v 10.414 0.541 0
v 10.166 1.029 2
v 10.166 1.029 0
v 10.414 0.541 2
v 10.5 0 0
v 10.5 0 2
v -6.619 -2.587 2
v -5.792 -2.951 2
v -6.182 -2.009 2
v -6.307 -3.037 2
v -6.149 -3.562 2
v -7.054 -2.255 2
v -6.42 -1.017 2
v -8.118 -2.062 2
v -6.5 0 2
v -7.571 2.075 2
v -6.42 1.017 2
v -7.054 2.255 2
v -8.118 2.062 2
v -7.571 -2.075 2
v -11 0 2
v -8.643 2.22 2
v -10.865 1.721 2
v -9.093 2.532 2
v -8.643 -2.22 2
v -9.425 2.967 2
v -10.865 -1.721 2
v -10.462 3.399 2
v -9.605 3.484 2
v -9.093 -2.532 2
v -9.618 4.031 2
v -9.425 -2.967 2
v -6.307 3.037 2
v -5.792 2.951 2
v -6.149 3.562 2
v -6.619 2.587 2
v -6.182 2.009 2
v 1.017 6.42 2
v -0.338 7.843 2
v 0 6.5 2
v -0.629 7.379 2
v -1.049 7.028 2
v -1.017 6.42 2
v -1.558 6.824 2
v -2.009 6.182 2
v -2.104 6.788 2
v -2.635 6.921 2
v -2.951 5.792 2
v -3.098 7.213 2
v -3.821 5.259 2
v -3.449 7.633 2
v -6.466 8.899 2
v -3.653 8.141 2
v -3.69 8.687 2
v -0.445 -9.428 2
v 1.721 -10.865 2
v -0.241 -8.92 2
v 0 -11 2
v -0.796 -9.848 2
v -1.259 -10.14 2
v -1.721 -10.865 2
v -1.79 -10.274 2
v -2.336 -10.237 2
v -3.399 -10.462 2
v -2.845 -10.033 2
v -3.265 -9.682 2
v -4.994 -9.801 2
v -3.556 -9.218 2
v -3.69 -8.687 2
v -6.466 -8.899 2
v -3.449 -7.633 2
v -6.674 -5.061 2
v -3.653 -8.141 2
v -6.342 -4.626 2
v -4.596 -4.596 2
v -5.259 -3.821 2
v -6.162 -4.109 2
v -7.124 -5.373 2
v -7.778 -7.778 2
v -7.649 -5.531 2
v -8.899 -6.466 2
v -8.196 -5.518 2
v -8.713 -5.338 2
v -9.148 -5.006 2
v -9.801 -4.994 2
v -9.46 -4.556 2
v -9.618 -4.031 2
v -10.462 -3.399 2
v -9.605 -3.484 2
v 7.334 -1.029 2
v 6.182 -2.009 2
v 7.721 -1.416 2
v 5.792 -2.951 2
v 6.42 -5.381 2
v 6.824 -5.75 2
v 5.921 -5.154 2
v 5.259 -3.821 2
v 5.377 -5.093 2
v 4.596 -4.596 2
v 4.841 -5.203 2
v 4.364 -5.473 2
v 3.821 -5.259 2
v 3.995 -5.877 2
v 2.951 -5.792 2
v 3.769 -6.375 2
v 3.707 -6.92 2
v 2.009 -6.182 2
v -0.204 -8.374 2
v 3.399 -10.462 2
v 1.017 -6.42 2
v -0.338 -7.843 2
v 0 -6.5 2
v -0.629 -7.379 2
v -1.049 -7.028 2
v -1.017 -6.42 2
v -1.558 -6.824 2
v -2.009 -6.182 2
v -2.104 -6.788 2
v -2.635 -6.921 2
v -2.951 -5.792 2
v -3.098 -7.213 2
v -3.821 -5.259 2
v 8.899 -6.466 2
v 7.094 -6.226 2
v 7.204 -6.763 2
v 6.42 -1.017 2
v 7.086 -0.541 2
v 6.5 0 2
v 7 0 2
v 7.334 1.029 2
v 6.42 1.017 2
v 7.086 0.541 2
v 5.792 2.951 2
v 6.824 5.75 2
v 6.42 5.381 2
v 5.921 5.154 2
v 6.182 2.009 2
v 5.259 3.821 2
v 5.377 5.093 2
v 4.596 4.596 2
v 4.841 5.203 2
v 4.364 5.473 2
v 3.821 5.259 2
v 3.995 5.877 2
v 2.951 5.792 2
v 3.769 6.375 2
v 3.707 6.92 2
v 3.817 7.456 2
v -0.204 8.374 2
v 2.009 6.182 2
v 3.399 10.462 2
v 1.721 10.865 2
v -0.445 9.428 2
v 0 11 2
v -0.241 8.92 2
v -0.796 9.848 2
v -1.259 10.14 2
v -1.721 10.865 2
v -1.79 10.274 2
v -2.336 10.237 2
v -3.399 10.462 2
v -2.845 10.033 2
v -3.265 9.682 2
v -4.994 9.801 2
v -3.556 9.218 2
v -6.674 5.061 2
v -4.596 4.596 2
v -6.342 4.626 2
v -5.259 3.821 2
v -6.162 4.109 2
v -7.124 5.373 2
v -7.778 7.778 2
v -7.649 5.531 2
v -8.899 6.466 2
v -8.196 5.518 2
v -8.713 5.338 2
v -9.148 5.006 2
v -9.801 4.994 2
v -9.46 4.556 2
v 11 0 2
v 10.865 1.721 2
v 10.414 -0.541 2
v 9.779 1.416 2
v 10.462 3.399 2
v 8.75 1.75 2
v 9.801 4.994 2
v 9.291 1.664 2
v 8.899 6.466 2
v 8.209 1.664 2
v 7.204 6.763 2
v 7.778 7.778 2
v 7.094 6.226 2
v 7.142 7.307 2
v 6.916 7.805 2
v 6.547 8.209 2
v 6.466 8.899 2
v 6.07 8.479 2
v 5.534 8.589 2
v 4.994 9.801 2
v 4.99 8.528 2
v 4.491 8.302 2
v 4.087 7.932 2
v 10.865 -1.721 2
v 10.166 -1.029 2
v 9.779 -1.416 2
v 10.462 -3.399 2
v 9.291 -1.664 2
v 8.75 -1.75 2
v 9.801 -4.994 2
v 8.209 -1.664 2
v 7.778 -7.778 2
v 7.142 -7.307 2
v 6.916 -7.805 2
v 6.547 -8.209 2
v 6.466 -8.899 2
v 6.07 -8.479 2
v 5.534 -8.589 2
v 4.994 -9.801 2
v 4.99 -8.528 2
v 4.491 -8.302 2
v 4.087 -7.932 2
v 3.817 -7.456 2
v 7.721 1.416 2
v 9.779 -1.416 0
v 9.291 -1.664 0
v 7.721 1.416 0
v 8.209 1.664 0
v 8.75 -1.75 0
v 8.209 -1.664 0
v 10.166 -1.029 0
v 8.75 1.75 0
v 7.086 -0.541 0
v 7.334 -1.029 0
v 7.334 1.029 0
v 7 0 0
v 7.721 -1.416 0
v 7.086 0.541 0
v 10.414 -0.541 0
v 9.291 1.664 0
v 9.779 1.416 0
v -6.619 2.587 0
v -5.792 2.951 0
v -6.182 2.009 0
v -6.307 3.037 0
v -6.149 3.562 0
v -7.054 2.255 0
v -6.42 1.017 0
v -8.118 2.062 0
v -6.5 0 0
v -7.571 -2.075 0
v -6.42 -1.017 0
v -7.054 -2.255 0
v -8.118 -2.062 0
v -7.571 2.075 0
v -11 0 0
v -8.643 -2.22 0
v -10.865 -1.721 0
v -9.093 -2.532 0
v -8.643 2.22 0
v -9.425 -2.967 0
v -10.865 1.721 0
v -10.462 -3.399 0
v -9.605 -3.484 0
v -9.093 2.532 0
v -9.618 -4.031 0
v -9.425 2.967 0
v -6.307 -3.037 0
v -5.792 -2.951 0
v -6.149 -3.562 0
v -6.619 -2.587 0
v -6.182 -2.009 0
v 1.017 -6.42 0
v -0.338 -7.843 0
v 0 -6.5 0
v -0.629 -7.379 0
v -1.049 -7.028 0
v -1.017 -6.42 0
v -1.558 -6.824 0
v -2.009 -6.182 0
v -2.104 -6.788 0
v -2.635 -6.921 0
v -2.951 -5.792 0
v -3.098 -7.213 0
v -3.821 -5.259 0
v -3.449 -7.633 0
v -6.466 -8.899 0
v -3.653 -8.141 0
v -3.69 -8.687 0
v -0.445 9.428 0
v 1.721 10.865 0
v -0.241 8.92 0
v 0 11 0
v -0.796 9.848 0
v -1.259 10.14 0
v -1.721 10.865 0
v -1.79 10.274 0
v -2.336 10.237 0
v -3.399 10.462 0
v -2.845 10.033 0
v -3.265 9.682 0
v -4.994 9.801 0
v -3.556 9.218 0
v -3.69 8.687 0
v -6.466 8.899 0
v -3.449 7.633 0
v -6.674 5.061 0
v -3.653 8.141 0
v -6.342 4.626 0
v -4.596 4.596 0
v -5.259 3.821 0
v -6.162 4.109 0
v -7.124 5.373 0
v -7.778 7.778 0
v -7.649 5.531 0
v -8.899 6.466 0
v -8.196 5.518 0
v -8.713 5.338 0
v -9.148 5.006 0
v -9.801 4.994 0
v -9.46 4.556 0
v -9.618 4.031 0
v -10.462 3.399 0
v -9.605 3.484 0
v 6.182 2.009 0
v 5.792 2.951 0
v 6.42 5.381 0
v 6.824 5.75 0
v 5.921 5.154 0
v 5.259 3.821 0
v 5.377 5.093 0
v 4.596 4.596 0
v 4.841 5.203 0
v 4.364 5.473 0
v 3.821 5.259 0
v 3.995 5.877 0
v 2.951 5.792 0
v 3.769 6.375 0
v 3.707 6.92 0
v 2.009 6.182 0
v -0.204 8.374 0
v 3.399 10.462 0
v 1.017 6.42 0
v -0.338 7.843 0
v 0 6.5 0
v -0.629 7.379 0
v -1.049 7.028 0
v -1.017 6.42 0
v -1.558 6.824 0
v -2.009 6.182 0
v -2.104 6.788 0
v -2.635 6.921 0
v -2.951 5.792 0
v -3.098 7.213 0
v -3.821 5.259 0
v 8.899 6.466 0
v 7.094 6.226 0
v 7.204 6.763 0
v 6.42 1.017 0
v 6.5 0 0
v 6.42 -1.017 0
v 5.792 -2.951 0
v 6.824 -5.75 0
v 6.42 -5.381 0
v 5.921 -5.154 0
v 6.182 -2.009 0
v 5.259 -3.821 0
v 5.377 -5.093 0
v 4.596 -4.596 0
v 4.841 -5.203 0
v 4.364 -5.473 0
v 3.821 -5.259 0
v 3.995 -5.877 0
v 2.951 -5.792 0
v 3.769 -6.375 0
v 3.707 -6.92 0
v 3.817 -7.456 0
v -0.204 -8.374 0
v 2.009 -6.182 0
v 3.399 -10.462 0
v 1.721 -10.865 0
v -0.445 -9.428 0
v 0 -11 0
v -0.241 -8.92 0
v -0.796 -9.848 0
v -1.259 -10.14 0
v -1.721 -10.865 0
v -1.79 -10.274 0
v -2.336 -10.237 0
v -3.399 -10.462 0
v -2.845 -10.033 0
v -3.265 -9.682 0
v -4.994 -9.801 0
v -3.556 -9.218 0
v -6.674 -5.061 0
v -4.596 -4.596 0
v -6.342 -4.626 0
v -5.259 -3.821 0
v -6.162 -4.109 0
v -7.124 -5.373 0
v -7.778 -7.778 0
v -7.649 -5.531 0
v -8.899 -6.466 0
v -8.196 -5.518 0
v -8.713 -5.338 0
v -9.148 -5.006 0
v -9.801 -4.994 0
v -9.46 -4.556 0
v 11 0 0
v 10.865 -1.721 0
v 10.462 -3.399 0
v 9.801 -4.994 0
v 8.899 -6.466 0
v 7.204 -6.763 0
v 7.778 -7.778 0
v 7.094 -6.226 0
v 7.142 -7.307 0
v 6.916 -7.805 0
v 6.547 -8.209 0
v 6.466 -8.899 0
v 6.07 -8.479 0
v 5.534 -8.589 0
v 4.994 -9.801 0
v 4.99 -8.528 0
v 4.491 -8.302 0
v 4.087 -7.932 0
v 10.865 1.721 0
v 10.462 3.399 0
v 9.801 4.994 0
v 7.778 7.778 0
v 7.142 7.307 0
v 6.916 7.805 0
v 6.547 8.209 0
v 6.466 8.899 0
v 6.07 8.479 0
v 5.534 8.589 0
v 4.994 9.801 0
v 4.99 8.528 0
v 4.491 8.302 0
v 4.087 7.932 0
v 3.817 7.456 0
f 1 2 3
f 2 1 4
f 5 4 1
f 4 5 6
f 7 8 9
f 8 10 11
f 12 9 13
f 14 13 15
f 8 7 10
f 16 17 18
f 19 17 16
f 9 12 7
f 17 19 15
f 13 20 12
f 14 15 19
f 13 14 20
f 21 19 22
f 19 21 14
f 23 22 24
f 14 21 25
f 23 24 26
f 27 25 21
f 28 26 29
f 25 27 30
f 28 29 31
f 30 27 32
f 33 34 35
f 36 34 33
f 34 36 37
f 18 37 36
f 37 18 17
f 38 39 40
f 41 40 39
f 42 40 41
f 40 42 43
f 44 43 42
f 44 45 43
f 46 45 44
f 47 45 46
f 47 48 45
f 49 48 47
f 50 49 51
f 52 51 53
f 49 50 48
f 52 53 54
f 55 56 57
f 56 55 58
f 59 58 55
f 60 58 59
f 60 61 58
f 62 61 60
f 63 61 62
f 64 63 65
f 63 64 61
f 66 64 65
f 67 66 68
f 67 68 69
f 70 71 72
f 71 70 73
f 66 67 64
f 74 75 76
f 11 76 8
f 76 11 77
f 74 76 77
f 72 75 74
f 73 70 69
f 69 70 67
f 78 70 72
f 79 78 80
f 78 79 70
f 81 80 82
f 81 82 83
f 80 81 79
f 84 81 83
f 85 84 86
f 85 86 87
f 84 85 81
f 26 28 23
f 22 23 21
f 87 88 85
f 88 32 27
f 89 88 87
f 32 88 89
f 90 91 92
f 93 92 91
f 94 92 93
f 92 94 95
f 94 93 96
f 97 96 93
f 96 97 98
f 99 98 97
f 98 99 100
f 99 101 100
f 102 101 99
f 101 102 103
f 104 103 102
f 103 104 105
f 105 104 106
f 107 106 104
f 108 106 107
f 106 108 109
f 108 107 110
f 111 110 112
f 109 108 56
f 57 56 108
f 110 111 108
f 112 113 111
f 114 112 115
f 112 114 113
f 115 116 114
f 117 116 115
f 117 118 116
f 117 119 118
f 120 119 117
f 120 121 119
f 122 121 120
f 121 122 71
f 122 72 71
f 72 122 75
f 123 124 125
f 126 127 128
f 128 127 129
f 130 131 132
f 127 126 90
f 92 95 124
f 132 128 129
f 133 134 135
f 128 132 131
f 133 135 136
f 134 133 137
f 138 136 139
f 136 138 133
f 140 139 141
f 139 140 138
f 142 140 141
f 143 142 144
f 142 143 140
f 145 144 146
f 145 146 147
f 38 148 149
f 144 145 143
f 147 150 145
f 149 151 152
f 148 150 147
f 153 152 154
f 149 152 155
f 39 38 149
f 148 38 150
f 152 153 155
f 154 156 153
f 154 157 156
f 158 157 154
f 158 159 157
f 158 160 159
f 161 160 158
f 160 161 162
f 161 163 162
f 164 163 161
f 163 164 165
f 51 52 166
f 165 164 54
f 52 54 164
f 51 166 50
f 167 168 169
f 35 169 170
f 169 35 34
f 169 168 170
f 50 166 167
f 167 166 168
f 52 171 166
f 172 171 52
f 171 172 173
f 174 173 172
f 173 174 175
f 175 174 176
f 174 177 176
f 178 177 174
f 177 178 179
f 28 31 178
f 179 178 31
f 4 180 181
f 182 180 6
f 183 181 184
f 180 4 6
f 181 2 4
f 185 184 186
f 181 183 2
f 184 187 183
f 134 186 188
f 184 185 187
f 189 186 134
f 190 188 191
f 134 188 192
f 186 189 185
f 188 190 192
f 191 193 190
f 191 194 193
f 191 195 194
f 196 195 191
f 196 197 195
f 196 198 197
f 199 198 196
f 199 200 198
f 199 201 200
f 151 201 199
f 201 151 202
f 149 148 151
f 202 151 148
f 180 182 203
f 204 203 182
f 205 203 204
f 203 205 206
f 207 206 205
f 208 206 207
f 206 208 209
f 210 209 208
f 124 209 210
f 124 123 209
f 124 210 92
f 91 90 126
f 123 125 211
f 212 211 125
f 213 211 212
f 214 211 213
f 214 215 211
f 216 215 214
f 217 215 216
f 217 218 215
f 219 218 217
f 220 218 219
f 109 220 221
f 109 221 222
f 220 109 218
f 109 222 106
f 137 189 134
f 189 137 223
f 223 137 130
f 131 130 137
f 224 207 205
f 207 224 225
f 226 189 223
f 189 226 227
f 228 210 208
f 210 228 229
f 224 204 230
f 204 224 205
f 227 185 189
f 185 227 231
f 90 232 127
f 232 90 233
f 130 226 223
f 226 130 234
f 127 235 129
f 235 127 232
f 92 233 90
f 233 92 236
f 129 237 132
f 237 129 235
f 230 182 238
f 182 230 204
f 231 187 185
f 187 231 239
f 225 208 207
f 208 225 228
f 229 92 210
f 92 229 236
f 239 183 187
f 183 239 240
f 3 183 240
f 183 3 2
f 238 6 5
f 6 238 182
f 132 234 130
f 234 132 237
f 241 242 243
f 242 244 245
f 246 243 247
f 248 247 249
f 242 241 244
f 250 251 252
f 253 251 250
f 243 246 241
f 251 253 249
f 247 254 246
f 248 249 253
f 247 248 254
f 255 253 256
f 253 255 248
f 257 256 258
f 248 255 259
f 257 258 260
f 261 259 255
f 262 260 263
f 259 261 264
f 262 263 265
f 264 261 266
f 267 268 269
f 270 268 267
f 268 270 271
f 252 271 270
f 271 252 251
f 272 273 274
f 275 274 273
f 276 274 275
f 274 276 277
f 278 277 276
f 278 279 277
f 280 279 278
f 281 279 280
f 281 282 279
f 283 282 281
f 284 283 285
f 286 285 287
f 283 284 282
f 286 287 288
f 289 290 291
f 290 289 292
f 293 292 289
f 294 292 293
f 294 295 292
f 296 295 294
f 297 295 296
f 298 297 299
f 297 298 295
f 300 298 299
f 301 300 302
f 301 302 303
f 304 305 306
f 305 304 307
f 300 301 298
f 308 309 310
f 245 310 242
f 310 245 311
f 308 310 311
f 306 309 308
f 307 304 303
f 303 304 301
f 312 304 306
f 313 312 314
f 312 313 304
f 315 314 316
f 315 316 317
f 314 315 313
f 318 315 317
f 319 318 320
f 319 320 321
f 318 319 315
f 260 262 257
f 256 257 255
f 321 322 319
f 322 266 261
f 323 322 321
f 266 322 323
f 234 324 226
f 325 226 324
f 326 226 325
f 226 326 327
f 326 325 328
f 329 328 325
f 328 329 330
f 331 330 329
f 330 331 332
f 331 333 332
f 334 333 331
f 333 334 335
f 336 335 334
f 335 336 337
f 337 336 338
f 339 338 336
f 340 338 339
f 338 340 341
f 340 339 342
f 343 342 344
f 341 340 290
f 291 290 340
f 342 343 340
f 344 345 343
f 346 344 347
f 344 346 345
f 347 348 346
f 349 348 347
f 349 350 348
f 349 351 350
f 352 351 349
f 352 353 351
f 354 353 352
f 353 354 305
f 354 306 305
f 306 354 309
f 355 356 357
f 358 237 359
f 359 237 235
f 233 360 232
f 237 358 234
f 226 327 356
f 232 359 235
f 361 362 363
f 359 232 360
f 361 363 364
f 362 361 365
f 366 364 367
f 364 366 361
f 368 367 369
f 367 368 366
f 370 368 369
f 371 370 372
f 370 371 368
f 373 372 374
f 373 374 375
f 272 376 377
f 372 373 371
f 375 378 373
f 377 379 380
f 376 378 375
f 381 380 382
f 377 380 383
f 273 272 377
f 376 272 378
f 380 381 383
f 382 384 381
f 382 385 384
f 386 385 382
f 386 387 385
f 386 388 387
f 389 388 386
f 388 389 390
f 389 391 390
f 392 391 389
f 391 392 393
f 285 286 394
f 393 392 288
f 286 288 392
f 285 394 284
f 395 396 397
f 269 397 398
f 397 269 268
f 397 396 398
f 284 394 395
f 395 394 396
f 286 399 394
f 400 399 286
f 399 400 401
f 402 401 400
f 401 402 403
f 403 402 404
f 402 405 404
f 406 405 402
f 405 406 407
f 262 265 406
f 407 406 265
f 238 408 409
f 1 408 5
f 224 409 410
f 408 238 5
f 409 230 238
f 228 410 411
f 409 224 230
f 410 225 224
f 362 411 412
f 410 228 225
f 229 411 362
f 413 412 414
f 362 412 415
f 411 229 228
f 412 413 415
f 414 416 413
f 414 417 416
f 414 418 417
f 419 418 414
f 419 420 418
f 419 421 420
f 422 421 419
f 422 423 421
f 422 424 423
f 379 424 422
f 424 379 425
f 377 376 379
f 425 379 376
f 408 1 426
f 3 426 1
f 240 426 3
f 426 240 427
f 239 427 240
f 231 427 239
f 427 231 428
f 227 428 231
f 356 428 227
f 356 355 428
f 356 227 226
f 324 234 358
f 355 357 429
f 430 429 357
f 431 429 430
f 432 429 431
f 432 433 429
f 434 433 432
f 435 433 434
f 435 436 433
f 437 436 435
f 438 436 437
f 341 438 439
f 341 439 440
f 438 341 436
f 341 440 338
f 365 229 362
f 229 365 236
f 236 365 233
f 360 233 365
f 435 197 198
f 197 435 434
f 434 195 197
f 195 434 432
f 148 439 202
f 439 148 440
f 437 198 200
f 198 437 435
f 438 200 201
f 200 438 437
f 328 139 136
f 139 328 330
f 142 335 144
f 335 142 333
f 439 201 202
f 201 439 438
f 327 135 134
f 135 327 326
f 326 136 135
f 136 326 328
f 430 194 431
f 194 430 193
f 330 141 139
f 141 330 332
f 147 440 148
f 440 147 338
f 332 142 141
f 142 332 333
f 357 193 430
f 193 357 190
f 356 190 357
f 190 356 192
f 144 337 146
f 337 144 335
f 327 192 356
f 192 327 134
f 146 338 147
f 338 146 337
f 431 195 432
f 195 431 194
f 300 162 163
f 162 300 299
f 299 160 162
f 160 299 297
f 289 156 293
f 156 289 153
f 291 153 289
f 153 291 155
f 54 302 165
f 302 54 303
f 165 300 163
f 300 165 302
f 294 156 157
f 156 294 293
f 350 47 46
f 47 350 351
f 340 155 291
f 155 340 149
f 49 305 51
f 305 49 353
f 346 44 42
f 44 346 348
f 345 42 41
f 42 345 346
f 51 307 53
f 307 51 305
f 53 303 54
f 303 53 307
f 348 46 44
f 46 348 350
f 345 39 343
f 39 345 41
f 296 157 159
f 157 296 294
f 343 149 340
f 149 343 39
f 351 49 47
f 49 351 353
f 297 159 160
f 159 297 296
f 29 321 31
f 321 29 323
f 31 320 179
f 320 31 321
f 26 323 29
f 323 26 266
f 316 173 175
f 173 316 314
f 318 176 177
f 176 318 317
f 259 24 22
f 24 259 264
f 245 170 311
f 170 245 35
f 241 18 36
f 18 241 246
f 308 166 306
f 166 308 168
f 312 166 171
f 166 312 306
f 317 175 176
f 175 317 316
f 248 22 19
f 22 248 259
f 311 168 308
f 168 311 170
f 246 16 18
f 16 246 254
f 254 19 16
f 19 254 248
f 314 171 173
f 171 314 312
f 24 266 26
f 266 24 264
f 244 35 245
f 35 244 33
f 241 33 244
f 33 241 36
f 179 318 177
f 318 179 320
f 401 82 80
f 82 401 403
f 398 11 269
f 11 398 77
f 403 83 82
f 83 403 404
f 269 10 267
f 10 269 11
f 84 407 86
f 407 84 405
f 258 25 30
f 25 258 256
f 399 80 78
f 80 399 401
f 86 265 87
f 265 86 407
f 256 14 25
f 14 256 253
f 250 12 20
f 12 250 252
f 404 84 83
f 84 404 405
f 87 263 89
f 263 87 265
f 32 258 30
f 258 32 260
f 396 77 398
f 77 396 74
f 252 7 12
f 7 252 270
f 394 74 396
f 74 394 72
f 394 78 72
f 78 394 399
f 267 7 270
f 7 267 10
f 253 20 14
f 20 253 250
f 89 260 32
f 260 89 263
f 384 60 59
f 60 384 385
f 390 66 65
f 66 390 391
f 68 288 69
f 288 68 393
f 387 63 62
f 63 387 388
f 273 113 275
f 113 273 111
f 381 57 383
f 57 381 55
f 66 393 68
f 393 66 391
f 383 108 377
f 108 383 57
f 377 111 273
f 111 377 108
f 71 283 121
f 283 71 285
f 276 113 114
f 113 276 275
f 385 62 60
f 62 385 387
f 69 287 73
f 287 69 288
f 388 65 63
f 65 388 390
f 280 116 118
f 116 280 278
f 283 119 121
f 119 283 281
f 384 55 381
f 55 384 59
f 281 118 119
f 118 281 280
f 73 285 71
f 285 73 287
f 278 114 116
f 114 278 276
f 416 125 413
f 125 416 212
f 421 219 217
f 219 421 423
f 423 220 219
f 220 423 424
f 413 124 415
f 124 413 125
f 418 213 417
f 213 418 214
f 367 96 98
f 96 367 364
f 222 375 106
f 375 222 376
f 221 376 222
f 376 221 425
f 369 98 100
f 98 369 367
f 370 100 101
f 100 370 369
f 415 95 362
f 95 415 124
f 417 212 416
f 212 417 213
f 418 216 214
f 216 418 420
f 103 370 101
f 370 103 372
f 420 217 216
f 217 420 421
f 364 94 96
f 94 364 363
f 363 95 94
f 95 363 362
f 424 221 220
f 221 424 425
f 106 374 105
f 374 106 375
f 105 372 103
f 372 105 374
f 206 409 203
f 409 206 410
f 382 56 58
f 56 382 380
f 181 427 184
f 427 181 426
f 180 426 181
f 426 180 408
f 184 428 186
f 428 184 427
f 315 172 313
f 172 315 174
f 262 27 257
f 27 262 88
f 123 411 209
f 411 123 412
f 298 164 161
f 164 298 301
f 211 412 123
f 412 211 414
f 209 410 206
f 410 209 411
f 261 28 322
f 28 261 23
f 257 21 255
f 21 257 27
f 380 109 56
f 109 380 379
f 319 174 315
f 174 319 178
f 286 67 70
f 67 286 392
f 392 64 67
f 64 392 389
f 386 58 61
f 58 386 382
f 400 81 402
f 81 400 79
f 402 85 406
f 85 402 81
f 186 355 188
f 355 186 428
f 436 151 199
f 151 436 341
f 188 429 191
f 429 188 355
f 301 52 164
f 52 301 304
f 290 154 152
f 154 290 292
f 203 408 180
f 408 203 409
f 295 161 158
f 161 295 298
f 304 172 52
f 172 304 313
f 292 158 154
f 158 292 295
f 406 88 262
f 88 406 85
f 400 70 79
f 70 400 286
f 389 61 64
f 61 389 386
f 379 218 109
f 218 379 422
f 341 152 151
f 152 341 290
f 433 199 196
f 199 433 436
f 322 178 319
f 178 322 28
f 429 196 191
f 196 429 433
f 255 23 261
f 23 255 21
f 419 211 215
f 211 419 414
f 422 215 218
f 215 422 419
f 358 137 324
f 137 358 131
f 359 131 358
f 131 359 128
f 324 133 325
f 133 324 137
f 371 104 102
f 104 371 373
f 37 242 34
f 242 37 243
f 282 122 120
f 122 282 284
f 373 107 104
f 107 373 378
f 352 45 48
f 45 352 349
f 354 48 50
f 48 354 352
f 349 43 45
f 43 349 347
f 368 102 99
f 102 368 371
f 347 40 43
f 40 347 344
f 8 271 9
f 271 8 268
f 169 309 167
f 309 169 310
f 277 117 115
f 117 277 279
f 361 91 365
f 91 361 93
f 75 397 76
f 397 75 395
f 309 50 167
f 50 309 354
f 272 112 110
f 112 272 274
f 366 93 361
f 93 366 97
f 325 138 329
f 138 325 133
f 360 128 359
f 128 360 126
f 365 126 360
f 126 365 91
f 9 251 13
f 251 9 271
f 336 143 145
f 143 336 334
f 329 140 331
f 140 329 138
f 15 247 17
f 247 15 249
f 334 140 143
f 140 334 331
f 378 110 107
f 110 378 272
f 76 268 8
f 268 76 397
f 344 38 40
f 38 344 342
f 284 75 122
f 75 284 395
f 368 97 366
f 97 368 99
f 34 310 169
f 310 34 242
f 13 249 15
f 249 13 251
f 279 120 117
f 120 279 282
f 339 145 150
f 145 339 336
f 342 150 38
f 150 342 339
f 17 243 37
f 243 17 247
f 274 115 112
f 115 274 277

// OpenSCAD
// Height of magnets in mm
magnet_height=2;

// Big magnet diameter
big_magnet_dia = 13;

// Small magnet diameter
small_magnet_dia = 3.5;

// Number of small Magnets in the ring
no_small_magnets = 7;

// Wall thickness
wall_thickness = 0.5;

//How smooth you want the walls
fragments=40;

difference(){
    total_diameter=big_magnet_dia+2*small_magnet_dia+4*wall_thickness;
    cylinder(d=total_diameter, h=magnet_height, $fn=fragments);
    cylinder(d=big_magnet_dia, h=magnet_height, $fn=fragments);

    new_center=big_magnet_dia/2+small_magnet_dia/2+wall_thickness;
    for(angle=[0:(360/no_small_magnets):360]) {
        rotate([0,0,angle]) translate([new_center,0,0]) cylinder(d=small_magnet_dia,h=magnet_height, $fn=fragments/2);
    }
}
